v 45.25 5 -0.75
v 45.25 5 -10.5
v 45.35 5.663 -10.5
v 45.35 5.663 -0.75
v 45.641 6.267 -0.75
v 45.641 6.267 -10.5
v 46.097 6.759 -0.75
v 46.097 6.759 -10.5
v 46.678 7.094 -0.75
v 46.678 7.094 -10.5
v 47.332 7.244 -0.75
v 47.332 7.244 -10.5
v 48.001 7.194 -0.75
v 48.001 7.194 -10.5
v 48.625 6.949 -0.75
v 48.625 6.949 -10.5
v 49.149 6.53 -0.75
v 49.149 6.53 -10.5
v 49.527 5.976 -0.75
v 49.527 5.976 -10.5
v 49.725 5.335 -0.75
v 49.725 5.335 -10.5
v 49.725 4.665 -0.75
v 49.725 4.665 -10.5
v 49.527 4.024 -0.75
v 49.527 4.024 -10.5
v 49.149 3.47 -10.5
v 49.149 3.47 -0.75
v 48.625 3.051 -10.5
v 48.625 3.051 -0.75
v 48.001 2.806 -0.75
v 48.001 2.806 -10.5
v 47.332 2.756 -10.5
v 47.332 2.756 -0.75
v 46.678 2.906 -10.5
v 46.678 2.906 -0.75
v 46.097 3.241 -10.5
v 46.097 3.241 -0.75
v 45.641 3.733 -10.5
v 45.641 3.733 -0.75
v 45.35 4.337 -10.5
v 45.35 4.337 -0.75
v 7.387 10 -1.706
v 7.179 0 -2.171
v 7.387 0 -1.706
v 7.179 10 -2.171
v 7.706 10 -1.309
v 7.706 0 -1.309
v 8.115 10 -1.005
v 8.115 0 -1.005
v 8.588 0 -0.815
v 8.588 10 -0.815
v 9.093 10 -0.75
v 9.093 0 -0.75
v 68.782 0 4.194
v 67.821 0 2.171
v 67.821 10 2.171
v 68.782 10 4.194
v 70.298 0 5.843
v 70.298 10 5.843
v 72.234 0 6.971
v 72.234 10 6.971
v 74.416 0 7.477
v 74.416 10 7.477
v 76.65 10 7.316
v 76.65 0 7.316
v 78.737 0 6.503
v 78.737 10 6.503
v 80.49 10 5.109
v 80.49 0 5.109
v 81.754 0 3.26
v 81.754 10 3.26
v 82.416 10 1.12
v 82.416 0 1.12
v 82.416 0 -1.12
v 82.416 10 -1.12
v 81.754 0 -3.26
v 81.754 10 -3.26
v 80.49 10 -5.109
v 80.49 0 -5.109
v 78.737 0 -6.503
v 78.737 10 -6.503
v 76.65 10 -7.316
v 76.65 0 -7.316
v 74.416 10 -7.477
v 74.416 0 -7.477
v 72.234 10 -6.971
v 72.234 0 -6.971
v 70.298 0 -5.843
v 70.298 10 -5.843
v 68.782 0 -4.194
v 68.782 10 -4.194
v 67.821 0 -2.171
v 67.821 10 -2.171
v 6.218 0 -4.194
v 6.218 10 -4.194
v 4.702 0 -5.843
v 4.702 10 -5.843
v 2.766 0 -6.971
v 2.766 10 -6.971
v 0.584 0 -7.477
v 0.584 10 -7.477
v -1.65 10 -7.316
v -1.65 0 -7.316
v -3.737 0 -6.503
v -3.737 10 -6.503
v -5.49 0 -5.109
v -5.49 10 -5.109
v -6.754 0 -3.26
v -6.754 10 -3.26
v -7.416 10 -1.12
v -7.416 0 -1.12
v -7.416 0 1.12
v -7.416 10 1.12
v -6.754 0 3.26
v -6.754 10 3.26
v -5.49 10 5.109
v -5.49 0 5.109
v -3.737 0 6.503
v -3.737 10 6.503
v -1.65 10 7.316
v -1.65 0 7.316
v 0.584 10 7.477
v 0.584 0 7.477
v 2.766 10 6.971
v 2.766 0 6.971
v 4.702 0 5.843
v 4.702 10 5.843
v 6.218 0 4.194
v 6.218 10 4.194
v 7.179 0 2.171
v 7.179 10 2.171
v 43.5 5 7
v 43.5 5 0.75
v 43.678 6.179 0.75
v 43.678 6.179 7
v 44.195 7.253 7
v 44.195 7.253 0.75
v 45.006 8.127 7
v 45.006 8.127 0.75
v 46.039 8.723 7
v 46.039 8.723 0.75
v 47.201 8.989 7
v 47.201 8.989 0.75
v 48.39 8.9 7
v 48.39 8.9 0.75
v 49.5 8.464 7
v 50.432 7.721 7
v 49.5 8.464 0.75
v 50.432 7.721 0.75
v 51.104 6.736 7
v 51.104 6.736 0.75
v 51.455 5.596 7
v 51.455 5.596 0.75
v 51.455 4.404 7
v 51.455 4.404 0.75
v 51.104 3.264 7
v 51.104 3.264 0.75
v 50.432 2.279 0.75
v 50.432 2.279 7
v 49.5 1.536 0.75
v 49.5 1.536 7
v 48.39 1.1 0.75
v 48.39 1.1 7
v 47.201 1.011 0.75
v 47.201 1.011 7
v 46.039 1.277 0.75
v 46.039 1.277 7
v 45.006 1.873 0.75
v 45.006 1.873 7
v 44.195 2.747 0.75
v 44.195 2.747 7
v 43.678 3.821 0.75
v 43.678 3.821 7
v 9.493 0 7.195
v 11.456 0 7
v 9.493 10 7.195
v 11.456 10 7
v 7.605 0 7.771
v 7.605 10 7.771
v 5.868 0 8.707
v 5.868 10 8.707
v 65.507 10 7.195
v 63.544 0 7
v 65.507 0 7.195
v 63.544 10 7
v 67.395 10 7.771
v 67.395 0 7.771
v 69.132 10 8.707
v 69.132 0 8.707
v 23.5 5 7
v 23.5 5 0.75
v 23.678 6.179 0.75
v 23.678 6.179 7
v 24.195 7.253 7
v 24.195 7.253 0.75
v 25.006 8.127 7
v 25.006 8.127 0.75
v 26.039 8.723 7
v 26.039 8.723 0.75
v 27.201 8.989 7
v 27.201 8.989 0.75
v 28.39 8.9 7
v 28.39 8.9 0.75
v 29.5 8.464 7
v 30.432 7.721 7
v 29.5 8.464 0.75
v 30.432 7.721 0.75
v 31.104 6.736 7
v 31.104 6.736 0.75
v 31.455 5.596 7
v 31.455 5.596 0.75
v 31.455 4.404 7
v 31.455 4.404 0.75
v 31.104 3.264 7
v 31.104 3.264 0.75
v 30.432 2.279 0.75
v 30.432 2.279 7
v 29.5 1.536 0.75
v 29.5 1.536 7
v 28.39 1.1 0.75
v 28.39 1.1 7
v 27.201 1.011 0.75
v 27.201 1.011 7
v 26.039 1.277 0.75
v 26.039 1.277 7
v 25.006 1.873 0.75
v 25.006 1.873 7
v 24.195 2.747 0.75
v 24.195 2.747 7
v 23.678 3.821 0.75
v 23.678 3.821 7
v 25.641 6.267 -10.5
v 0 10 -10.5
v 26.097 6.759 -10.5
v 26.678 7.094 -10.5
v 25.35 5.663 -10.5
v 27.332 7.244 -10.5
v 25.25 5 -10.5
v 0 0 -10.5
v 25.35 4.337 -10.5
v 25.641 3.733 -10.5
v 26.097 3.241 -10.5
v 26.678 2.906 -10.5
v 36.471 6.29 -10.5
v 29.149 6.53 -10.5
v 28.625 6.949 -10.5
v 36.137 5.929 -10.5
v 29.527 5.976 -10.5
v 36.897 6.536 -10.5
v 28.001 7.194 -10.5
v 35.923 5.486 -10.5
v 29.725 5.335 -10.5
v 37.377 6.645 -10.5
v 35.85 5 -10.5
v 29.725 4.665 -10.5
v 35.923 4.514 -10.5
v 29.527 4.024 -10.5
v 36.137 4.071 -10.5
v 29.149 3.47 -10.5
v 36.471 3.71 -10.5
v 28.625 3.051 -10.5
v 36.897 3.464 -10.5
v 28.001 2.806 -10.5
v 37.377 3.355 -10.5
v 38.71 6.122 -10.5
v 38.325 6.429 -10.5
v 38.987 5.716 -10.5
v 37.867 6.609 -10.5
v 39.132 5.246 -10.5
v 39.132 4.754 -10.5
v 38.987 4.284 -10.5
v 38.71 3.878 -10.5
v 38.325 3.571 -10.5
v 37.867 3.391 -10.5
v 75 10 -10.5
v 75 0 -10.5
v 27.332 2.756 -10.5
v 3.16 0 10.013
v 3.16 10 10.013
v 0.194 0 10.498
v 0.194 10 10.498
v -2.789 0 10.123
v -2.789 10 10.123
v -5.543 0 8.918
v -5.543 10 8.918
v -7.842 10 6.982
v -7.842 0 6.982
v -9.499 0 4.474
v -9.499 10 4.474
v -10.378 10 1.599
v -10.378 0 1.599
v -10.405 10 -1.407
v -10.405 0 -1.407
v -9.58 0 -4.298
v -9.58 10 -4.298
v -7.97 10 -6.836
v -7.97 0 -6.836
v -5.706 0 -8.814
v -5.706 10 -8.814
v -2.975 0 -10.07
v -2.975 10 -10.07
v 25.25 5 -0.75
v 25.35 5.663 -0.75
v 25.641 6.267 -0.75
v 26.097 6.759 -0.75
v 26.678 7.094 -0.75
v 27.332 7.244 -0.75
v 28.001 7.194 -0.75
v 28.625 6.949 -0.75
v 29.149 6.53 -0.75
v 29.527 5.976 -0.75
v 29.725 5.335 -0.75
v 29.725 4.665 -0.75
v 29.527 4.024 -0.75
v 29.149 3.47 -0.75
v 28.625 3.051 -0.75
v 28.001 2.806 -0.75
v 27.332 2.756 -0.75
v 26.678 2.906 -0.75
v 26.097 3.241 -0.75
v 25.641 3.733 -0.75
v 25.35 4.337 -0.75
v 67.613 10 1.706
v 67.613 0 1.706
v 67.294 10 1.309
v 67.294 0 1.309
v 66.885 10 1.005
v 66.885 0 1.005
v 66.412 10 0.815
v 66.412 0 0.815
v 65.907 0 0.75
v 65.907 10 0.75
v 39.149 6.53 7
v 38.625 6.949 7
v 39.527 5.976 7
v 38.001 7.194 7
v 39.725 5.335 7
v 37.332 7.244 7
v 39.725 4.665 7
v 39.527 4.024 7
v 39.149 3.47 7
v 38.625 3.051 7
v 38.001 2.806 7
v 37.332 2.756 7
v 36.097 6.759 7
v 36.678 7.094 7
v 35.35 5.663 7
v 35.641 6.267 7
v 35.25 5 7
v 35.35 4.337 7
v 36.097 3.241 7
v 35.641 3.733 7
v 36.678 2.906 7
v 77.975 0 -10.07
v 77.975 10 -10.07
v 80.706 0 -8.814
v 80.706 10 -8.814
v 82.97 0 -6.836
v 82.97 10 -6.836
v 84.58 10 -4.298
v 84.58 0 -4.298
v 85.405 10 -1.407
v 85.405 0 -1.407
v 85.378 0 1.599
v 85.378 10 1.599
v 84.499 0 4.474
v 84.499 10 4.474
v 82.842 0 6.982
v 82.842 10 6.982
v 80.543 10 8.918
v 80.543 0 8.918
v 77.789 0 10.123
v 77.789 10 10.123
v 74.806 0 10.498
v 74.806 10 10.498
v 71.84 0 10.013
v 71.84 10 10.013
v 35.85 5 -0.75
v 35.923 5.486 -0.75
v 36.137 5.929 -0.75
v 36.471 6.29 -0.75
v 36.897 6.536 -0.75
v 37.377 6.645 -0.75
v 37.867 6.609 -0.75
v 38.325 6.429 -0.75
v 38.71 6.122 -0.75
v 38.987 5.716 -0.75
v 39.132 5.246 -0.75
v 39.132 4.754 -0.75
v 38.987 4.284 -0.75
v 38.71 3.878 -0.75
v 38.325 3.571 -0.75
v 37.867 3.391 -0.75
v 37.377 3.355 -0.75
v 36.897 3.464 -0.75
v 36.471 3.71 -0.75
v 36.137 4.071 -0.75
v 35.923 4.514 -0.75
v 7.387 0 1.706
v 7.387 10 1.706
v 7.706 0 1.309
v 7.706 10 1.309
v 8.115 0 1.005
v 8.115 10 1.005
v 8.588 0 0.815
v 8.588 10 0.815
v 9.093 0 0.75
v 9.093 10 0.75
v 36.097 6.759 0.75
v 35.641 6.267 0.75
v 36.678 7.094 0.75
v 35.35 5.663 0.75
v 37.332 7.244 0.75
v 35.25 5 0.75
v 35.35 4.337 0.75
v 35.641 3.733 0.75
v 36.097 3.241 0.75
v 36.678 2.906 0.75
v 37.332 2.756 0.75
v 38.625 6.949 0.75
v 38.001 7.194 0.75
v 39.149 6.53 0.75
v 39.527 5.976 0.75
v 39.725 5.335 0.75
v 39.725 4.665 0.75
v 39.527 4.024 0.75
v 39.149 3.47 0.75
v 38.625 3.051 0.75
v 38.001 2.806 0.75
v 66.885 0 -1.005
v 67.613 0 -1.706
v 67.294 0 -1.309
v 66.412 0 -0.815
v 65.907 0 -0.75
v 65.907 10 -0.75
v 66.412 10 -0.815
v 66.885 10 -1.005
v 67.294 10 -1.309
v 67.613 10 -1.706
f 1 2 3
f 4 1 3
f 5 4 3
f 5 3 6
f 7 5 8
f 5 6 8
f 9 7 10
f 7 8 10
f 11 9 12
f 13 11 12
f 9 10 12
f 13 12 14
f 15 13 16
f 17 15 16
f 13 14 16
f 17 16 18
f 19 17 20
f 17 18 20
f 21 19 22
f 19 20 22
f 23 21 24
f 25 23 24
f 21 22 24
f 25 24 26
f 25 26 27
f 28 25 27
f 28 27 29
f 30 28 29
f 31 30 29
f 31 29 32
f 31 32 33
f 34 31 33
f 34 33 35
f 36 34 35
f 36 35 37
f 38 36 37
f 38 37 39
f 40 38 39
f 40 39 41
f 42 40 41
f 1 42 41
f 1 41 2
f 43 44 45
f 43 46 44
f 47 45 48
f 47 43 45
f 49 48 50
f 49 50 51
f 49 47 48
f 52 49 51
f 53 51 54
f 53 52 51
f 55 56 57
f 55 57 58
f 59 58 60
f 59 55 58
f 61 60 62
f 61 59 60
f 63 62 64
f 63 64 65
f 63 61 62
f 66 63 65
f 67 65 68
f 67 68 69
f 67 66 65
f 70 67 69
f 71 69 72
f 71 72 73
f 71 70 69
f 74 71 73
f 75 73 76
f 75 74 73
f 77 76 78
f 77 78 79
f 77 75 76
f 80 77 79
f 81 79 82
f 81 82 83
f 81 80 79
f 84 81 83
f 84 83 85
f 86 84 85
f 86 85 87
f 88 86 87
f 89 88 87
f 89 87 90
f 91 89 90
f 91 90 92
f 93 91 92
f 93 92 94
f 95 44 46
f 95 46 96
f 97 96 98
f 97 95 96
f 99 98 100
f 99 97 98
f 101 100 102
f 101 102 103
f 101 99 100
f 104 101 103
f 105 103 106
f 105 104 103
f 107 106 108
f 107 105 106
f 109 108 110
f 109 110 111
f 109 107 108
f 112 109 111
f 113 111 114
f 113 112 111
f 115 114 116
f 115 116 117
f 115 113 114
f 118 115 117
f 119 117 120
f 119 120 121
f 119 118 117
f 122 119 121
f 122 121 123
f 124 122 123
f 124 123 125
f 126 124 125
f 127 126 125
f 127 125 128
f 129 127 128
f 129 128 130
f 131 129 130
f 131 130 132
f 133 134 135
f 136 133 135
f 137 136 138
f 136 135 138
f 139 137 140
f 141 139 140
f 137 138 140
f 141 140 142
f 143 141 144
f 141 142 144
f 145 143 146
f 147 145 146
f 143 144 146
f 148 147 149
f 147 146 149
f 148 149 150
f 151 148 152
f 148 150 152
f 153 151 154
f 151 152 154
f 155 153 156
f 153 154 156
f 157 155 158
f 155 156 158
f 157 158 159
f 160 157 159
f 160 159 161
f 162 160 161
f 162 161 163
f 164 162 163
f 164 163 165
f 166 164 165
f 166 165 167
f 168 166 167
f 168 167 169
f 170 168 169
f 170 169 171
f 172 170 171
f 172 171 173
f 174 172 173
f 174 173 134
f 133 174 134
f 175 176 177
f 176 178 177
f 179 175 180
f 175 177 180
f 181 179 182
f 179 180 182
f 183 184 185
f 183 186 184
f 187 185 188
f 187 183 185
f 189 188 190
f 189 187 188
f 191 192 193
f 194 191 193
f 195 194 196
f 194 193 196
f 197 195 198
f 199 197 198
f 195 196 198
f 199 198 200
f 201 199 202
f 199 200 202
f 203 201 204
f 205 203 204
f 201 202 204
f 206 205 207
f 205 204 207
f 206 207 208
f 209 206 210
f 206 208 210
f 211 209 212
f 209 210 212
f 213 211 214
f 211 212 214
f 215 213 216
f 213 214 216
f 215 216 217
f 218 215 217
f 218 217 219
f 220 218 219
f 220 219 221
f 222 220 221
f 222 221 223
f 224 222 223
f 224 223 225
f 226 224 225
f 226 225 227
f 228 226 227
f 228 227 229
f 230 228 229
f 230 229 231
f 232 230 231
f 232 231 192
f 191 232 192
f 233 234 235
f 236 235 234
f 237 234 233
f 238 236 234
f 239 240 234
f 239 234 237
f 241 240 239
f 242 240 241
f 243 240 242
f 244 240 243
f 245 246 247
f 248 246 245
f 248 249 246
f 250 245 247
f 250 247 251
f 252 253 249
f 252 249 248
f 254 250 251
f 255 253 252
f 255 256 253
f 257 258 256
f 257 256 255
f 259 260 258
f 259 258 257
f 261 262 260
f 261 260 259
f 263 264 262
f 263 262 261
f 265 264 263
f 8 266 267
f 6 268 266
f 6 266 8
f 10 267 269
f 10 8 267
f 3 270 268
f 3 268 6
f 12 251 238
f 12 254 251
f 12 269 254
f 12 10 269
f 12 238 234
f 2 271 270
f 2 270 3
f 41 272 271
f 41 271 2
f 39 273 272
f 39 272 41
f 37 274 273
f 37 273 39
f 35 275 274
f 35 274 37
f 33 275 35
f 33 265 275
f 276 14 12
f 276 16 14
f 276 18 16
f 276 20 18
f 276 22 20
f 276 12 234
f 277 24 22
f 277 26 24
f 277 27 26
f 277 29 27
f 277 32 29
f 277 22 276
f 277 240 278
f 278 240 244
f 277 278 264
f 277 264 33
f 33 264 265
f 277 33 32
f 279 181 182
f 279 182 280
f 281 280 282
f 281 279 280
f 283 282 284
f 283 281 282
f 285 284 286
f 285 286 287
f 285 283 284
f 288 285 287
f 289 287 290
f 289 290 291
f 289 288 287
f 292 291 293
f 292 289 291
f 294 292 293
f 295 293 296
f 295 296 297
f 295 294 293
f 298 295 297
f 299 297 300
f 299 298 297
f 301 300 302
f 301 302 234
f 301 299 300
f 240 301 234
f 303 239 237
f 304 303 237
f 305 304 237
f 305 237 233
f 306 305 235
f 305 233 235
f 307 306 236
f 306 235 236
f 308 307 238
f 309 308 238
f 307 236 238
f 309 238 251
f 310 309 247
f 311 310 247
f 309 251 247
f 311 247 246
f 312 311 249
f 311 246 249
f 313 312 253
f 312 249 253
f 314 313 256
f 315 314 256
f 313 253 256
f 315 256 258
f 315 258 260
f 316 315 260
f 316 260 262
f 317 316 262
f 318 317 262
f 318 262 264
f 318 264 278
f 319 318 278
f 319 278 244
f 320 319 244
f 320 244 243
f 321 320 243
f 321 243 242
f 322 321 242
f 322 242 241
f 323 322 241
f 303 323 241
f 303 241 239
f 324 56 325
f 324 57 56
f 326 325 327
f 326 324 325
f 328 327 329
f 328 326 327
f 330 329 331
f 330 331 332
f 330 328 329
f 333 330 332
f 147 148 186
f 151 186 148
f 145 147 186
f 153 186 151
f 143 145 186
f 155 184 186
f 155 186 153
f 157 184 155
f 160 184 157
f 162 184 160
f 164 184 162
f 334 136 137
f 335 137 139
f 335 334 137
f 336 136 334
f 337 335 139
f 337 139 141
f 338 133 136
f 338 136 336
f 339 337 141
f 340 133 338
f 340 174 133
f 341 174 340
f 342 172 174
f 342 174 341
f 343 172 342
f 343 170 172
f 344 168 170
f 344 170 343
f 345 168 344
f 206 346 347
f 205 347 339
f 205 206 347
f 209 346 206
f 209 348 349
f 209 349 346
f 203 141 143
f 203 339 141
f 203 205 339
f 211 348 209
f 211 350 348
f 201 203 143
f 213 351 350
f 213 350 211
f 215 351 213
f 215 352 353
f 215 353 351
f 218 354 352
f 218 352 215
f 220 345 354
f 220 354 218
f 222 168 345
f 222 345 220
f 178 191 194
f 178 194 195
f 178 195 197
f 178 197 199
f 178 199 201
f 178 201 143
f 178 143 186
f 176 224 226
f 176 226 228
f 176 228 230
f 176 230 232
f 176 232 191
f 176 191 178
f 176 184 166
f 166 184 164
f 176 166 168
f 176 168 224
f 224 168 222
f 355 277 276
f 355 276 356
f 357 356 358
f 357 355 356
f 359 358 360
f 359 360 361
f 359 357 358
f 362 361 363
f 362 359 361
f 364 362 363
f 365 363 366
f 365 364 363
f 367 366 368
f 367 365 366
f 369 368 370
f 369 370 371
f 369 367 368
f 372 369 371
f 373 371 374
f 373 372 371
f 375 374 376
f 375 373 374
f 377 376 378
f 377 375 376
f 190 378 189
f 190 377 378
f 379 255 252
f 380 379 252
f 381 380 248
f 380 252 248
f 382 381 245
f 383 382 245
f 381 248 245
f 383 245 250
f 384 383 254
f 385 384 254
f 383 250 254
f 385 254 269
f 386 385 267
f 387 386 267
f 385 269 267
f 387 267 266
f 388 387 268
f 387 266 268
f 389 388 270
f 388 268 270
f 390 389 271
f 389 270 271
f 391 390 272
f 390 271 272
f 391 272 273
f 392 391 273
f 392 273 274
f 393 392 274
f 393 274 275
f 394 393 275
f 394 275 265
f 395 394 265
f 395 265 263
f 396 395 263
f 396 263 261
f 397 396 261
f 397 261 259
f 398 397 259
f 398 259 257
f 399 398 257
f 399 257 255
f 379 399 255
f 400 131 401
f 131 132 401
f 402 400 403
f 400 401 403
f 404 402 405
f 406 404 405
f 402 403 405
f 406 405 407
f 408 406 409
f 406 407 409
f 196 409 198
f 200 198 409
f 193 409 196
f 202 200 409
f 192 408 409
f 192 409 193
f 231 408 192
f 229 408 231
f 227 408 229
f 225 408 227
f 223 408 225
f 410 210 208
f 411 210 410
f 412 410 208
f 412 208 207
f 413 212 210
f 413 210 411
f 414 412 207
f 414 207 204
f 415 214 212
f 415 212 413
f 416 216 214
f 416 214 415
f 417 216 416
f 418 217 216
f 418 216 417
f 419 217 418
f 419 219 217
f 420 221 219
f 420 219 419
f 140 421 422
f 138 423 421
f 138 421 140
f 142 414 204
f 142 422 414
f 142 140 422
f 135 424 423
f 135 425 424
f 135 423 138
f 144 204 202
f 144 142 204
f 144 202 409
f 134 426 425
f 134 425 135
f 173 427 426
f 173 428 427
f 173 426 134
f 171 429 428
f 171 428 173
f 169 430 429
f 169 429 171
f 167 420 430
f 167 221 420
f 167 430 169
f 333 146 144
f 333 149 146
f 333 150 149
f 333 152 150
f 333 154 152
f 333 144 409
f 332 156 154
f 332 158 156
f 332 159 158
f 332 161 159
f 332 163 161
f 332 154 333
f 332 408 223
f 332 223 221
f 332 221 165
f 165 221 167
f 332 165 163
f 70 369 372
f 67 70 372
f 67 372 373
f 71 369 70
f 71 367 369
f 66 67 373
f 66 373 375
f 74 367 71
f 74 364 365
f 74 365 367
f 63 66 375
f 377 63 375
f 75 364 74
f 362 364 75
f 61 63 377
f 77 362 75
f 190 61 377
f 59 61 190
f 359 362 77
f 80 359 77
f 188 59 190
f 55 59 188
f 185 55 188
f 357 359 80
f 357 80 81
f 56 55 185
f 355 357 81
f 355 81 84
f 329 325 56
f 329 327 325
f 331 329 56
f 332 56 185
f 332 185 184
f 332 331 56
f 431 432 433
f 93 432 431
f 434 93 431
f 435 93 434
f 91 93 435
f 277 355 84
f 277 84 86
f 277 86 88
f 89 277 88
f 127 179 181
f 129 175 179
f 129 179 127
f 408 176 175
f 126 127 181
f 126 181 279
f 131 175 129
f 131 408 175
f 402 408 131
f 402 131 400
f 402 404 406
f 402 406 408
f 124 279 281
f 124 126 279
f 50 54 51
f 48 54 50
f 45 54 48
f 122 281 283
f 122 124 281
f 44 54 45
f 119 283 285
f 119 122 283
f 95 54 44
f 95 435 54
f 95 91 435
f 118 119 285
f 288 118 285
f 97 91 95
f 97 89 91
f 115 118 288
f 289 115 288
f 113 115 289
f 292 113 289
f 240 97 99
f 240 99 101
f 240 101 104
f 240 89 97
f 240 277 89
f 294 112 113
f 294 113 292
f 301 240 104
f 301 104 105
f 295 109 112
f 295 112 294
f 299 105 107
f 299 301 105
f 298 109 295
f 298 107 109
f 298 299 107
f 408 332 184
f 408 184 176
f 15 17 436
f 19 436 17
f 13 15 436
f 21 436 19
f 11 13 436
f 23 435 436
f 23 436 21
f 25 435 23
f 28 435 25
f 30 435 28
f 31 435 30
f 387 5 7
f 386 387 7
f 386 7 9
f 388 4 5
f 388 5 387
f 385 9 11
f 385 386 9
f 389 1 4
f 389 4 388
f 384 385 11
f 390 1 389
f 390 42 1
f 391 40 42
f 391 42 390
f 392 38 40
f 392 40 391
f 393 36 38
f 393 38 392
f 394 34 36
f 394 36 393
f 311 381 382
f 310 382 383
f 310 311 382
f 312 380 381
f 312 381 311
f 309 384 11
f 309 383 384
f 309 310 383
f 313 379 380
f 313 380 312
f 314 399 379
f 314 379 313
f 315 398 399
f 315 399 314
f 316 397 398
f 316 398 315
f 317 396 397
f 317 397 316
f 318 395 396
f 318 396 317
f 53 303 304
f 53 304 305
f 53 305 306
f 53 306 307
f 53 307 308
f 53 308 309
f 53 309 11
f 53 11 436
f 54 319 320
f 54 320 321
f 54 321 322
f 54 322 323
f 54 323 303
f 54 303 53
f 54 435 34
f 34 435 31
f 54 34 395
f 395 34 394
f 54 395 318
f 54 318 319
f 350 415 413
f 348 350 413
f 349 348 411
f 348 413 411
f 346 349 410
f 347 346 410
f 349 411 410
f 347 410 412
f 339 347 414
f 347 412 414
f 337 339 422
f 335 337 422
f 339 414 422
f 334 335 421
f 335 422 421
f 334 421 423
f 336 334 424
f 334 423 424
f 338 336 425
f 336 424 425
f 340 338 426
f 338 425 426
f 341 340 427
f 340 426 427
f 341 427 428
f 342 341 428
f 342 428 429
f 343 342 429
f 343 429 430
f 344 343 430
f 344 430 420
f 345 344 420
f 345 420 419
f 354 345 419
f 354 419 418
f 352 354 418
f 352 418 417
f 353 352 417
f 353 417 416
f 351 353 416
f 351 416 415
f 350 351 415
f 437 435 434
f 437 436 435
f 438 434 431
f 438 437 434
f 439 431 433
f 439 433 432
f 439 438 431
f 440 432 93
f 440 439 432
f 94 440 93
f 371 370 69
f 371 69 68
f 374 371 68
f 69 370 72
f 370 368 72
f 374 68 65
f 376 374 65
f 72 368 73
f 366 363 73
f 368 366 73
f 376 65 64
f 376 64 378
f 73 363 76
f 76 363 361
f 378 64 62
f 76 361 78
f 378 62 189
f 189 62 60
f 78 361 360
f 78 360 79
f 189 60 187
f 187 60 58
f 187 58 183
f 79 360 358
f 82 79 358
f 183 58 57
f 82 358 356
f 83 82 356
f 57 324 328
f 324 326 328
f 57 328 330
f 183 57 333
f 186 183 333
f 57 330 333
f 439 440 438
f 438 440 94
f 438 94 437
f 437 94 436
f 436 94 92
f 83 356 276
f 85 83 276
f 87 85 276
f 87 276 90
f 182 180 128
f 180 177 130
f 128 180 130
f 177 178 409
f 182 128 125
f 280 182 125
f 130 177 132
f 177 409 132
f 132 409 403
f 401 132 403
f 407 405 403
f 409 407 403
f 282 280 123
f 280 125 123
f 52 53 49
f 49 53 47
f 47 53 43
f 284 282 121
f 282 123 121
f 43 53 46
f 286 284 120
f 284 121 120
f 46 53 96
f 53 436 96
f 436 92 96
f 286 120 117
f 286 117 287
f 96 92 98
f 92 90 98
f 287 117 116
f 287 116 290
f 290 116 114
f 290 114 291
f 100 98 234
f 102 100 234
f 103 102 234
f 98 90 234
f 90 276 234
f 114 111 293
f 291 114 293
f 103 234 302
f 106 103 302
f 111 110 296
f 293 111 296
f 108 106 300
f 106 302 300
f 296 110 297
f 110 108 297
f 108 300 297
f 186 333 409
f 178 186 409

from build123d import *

# Parameters (mm, degrees)
EXTRUDE_1_DEPTH           = 10
HOLE_WIZARD_8_0_8_1_D     = 8
HOLE_WIZARD_8_0_8_1_DEPTH = 6.25
HOLE_WIZARD_M41_D         = 4.5
HOLE_WIZARD_M41_DEPTH     = 11
HOLE_WIZARD_M41_TIP       = 1.351936393
HOLE_WIZARD_M42_D         = 4.5
HOLE_WIZARD_M42_DEPTH     = 6.25
M4X0_72_D                 = 3.3
FILLET_2_R                = 10
FILLET_3_R                = 2


with BuildPart() as part:
    # Эскиз1 → Бобышка-Вытянуть1 (new body)
    with BuildSketch(Plane(origin=(0, 0, 0), x_dir=(1, 0, 0), z_dir=(0, 1, 0))):
        with BuildLine():
            Line((67.173762079, -7), (7.826237921, -7))
            ThreePointArc((7.826237921, -7), (-9.585144756, -4.28660705), (0, 10.5))
            Line((0, 10.5), (75, 10.5))
            ThreePointArc((75, 10.5), (84.585144756, -4.28660705), (67.173762079, -7))
        make_face()
        with BuildLine():
            Line((7.462405778, -0.75), (67.537594222, -0.75))
            ThreePointArc((67.537594222, -0.75), (82.5, 0), (67.537594222, 0.75))
            Line((67.537594222, 0.75), (7.462405778, 0.75))
            ThreePointArc((7.462405778, 0.75), (-7.5, 0), (7.462405778, -0.75))
        make_face(mode=Mode.SUBTRACT)
    extrude(amount=EXTRUDE_1_DEPTH)

    # Диаметр отверстия Ø8.0 (8)1
    with Locations(Plane.XY.offset(7)):
        with Locations((27.5, 5), (47.5, 5)):
            Hole(HOLE_WIZARD_8_0_8_1_D / 2, depth=HOLE_WIZARD_8_0_8_1_DEPTH)

    # Отверстие с зазором M41
    with Locations(Plane.XY.offset(-0.75)):
        with Locations((47.5, 5), (27.5, 5)):
            Hole(HOLE_WIZARD_M41_D / 2, depth=HOLE_WIZARD_M41_DEPTH)
            with Locations((0, 0, -(HOLE_WIZARD_M41_DEPTH + HOLE_WIZARD_M41_TIP / 2))):  # 118° drill point
                Cone(0, HOLE_WIZARD_M41_D / 2, HOLE_WIZARD_M41_TIP, mode=Mode.SUBTRACT)

    # Отверстие с зазором M42
    with Locations(Plane.XY.offset(7)):
        with Locations((37.5, 5)):
            Hole(HOLE_WIZARD_M42_D / 2, depth=HOLE_WIZARD_M42_DEPTH)

    # Отверстие обработанное метчиком M4x0.72 (through all)
    with Locations(Plane.XY.offset(-0.75)):
        with Locations((37.5, 5)):
            Hole(M4X0_72_D / 2)

    # Скругление2
    fillet_2_edges = [part.edges().sort_by_distance(p)[0] for p in [
        (67.173762079, 5, 7),
        (7.826237921, 5, 7),
    ]]
    fillet(fillet_2_edges, radius=FILLET_2_R)

    # Скругление3
    fillet_3_edges = [part.edges().sort_by_distance(p)[0] for p in [
        (7.462405778, 5, -0.75),
        (7.462405778, 5, 0.75),
        (67.537594222, 5, 0.75),
        (67.537594222, 5, -0.75),
    ]]
    fillet(fillet_3_edges, radius=FILLET_3_R)


solid = part.part
